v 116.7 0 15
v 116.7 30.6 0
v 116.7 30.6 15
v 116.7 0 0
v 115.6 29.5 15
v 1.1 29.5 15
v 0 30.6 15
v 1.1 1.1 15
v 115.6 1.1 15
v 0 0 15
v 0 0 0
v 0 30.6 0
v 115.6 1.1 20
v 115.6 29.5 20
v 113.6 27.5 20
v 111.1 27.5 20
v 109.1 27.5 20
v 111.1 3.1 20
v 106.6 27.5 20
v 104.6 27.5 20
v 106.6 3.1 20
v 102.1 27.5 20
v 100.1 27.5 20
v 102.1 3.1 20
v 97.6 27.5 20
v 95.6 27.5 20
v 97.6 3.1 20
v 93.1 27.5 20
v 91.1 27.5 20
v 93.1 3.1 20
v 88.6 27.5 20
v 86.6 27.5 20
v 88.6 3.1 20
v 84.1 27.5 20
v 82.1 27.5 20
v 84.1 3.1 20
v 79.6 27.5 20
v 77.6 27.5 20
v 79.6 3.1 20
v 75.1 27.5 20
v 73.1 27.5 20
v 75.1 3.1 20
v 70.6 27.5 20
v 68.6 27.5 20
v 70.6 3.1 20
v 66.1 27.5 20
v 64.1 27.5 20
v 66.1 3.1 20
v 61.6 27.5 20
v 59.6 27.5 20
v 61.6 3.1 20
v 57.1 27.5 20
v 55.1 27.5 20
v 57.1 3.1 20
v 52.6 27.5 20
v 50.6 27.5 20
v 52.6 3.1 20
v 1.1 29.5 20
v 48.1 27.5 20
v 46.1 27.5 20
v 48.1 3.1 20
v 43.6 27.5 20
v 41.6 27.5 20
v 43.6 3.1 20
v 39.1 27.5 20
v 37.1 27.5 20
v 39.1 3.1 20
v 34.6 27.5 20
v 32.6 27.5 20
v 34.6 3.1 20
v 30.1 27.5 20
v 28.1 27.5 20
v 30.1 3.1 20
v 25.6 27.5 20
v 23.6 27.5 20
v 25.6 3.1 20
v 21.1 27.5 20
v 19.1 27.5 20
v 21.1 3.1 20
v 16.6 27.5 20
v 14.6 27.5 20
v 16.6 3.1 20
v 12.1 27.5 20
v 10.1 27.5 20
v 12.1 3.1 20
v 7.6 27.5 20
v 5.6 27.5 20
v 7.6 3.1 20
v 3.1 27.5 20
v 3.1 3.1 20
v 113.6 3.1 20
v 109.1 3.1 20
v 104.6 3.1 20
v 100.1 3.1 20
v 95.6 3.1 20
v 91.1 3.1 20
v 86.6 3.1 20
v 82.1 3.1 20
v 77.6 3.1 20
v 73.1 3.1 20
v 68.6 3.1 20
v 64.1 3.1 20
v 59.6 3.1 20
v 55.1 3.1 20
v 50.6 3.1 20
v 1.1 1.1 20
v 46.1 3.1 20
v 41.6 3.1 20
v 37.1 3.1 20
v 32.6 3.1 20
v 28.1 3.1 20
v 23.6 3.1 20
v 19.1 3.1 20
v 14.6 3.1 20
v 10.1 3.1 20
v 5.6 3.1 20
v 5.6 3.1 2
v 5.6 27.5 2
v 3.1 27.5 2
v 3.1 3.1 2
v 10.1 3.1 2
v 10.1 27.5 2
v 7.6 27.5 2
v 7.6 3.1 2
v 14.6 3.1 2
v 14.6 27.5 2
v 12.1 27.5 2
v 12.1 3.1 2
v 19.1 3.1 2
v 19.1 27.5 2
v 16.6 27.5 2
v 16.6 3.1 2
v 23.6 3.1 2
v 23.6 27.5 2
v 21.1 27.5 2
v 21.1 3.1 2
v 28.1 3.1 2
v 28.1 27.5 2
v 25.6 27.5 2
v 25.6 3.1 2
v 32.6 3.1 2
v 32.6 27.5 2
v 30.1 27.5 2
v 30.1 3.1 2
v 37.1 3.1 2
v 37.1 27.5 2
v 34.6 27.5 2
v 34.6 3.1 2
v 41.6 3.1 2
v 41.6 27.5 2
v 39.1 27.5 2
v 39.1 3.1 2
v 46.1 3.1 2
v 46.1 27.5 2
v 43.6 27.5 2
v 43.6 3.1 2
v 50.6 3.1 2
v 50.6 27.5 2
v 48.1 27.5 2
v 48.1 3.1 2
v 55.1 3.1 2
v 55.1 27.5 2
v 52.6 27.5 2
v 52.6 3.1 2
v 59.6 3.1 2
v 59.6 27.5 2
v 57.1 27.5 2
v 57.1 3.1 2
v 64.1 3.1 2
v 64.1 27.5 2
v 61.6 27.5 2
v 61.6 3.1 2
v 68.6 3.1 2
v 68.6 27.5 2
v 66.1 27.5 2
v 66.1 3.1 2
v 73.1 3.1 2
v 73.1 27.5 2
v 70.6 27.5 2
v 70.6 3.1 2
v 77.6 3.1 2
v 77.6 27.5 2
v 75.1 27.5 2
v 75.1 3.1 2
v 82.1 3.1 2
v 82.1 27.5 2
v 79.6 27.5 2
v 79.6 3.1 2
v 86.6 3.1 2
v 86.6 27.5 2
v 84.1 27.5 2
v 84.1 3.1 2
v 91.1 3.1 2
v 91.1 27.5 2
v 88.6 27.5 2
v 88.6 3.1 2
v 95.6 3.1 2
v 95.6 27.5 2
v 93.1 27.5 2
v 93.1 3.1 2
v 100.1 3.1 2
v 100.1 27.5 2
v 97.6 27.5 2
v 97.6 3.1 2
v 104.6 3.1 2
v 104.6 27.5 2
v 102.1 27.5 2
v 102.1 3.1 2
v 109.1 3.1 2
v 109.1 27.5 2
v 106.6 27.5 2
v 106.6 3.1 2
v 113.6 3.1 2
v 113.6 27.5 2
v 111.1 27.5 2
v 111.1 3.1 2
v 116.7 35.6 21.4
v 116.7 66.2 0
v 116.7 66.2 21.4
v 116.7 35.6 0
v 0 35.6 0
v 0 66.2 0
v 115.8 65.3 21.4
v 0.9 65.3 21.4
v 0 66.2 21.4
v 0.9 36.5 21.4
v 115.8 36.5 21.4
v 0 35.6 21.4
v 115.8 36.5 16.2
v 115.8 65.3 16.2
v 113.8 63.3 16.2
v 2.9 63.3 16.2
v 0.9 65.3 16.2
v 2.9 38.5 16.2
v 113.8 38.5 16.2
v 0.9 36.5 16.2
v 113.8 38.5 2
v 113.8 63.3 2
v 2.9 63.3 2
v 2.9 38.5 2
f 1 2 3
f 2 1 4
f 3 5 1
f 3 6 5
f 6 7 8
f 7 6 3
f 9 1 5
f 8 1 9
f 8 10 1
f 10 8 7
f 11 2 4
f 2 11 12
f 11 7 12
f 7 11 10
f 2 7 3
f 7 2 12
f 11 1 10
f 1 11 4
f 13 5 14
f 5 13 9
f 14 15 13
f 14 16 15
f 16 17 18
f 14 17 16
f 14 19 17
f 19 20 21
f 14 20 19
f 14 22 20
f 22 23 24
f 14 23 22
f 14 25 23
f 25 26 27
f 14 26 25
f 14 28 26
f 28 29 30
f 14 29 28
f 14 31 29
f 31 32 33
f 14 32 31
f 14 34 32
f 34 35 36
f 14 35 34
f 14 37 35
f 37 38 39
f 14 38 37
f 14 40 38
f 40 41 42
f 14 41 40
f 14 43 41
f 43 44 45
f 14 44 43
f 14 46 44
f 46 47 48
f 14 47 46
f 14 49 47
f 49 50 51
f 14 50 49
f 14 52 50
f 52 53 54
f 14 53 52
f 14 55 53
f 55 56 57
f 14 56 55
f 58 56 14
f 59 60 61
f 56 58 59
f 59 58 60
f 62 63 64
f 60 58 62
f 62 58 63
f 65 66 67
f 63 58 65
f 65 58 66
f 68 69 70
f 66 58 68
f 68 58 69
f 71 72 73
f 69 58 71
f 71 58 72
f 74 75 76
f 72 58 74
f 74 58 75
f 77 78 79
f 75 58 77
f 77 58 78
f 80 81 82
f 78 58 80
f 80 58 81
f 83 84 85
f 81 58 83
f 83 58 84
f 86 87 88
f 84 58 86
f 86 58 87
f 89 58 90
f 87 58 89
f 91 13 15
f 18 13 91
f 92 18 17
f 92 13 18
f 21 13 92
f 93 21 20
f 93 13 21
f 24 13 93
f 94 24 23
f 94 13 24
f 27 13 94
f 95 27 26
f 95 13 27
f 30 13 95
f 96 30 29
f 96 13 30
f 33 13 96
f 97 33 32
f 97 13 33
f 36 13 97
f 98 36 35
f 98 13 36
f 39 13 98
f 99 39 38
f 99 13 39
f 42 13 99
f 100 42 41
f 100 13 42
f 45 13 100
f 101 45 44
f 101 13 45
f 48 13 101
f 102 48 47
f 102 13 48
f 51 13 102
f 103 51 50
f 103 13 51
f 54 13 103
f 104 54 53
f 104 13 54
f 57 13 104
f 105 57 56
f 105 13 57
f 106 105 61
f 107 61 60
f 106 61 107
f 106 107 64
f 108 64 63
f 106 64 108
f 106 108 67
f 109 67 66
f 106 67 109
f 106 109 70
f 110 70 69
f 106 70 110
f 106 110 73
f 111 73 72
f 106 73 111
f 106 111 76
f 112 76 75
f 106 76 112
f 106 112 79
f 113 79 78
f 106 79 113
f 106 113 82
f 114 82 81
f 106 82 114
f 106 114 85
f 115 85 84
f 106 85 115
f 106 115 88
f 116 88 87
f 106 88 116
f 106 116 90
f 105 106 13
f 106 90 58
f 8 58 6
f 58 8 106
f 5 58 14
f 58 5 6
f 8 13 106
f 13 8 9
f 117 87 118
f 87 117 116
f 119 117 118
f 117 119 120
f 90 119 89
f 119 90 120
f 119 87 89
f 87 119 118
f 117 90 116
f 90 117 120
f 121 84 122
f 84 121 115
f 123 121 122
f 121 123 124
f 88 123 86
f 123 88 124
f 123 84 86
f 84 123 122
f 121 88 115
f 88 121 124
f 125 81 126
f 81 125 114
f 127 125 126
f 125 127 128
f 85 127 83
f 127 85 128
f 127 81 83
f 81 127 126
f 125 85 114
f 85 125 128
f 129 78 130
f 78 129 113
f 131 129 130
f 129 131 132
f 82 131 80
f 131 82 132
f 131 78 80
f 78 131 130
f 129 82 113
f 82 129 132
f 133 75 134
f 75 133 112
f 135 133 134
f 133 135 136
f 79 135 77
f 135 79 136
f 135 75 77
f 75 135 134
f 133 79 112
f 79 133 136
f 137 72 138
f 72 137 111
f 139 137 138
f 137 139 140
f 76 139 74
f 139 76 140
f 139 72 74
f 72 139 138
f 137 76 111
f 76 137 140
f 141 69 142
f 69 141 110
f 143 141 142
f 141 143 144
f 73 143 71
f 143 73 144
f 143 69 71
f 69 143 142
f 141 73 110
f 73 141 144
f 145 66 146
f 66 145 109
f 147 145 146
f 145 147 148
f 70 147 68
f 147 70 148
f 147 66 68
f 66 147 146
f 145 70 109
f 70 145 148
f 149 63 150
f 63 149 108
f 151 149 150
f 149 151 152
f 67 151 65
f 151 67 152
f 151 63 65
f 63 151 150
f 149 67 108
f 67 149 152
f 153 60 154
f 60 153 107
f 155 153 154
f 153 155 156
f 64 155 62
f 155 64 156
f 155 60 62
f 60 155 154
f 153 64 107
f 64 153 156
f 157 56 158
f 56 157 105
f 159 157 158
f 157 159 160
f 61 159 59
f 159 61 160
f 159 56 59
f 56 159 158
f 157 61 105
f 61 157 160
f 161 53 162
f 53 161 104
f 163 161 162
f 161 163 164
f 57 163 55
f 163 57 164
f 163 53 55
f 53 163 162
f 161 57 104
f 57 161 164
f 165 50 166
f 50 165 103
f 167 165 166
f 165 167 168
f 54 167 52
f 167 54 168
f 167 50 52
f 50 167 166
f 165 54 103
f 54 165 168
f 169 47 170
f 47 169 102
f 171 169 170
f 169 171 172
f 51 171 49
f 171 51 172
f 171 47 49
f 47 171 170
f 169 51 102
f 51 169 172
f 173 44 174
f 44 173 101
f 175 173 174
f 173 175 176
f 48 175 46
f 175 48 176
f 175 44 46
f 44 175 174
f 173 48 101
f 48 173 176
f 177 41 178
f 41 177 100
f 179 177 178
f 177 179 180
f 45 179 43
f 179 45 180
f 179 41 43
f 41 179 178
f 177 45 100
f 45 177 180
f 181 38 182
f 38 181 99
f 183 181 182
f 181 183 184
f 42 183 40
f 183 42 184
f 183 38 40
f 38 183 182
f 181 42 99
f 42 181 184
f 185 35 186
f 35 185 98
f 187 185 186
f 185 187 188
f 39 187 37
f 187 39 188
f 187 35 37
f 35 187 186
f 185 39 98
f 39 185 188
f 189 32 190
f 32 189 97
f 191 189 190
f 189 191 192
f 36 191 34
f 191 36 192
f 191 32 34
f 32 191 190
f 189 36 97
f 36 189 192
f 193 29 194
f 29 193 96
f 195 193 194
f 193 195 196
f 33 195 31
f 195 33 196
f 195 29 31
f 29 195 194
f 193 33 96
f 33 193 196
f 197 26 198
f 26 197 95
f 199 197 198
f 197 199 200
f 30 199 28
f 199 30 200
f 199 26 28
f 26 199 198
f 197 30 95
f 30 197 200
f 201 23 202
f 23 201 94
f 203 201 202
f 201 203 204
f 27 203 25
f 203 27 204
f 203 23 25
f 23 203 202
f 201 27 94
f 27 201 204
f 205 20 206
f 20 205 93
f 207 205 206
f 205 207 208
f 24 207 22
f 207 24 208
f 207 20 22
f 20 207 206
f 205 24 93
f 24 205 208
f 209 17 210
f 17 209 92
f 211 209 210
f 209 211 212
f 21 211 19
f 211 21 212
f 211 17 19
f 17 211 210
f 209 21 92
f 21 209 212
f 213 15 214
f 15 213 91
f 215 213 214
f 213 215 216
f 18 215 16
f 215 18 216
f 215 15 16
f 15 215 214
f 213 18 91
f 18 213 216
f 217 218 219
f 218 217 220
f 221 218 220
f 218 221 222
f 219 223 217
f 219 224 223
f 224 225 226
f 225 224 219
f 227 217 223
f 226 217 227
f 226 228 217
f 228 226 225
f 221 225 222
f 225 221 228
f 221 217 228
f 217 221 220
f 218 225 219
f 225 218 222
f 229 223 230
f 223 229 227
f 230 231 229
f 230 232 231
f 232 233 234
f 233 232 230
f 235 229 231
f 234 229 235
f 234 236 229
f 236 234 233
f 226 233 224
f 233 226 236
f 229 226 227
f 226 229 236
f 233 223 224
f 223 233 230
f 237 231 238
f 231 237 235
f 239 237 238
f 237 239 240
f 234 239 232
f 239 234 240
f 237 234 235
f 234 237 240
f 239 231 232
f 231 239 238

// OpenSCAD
num_cards =25;

mode="both"; // [base, cap, both]

module cards(){
for(i=[0:num_cards-1]){
  translate([3.1+(4.5*i),3.1,2]) 
  cube([2.5,24.4,32.4],false);
}    
}

module base(){
    color([1,0.75,0.75])
difference(){
union(){
cube([num_cards*4.5+4.2,30.6,15]);

translate([1.1,1.1,0])
cube([num_cards*4.5+2,28.4,20],false);
}

cards();
}}

module cap(){
    
    translate([0,30.6,21.4])
    rotate([180,0,0])
    color([0.75,0.75,1])
  //  translate([0,0,35.6])
    difference(){
        cube([num_cards*4.5+4.2,30.6,21.4]);
    
        color([1,0,1])
        translate([0.9,0.9,-1])
    
        cube([num_cards*4.5+2.4,28.8,6.2]);
        
        translate([2.9,2.9,5])
        cube([num_cards*4.5-1.6,24.8,14.4]);
    }
}

if (mode=="base"){
  base();
}else if (mode =="cap"){
    cap();
}else if (mode =="both"){
    base();
    translate([0,35.6,0])
    cap();
}
